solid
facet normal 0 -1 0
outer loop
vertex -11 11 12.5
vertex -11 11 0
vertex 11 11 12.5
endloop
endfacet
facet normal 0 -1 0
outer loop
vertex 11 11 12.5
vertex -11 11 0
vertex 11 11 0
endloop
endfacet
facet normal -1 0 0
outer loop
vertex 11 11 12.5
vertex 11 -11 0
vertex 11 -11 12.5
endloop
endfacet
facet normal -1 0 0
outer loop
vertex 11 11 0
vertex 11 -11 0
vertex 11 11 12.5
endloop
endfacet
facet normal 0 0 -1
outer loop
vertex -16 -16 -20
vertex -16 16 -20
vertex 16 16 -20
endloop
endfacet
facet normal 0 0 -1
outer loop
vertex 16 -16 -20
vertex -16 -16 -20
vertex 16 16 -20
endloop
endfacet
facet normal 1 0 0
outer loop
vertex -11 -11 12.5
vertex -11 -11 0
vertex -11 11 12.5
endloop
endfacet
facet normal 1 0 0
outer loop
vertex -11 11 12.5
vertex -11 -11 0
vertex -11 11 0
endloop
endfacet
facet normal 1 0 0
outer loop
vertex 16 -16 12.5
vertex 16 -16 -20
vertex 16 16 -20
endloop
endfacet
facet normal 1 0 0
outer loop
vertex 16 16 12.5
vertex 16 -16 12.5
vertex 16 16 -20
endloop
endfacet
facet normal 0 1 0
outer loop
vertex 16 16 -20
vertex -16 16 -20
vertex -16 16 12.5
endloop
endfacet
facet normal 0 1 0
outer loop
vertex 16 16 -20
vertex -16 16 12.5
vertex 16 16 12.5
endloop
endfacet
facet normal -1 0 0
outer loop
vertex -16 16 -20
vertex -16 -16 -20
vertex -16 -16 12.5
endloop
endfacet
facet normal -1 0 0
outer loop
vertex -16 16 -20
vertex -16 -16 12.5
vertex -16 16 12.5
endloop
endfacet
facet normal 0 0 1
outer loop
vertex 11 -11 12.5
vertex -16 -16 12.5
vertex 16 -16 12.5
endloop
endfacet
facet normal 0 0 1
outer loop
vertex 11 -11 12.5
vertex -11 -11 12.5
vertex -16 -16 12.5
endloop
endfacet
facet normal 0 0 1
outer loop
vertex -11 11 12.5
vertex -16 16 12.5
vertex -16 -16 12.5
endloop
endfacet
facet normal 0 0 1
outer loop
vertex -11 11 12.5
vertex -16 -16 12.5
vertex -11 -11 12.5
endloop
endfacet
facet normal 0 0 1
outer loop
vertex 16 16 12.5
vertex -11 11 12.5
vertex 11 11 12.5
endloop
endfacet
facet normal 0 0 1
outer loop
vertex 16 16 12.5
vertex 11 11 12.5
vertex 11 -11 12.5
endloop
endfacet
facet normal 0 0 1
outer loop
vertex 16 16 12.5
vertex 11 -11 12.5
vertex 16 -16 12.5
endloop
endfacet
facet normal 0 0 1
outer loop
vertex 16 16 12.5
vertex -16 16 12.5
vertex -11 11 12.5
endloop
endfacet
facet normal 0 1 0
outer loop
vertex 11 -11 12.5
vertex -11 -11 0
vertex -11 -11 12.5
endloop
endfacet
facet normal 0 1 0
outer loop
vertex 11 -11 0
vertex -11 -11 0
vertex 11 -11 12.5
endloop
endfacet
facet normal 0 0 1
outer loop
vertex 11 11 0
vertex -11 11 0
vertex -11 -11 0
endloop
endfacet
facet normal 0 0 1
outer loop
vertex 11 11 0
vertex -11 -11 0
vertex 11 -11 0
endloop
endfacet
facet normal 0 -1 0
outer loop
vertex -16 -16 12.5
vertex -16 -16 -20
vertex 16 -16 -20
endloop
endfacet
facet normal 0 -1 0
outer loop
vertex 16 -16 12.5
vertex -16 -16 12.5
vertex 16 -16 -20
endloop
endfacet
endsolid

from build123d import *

# Parameters (mm, degrees)
F0_W     = 32.0000015199
F0_H     = 32.0000015199
F0_W_2   = 22
F0_H_2   = 22
F1_DEPTH = 12.5
F2_DEPTH = 20


with BuildPart() as f1:
    # F0 (on Top) → F1 (new body)
    with BuildSketch(Plane.XY):
        Rectangle(F0_W, F0_H)
        Rectangle(F0_W_2, F0_H_2, mode=Mode.SUBTRACT)
    extrude(amount=F1_DEPTH)

    # F0 (on Top) → F2 (join)
    with BuildSketch(Plane.XY):
        Rectangle(F0_W, F0_H)
        Rectangle(F0_W_2, F0_H_2, mode=Mode.SUBTRACT)
        Rectangle(F0_W_2, F0_H_2)
    extrude(amount=-F2_DEPTH)


solid = f1.part
